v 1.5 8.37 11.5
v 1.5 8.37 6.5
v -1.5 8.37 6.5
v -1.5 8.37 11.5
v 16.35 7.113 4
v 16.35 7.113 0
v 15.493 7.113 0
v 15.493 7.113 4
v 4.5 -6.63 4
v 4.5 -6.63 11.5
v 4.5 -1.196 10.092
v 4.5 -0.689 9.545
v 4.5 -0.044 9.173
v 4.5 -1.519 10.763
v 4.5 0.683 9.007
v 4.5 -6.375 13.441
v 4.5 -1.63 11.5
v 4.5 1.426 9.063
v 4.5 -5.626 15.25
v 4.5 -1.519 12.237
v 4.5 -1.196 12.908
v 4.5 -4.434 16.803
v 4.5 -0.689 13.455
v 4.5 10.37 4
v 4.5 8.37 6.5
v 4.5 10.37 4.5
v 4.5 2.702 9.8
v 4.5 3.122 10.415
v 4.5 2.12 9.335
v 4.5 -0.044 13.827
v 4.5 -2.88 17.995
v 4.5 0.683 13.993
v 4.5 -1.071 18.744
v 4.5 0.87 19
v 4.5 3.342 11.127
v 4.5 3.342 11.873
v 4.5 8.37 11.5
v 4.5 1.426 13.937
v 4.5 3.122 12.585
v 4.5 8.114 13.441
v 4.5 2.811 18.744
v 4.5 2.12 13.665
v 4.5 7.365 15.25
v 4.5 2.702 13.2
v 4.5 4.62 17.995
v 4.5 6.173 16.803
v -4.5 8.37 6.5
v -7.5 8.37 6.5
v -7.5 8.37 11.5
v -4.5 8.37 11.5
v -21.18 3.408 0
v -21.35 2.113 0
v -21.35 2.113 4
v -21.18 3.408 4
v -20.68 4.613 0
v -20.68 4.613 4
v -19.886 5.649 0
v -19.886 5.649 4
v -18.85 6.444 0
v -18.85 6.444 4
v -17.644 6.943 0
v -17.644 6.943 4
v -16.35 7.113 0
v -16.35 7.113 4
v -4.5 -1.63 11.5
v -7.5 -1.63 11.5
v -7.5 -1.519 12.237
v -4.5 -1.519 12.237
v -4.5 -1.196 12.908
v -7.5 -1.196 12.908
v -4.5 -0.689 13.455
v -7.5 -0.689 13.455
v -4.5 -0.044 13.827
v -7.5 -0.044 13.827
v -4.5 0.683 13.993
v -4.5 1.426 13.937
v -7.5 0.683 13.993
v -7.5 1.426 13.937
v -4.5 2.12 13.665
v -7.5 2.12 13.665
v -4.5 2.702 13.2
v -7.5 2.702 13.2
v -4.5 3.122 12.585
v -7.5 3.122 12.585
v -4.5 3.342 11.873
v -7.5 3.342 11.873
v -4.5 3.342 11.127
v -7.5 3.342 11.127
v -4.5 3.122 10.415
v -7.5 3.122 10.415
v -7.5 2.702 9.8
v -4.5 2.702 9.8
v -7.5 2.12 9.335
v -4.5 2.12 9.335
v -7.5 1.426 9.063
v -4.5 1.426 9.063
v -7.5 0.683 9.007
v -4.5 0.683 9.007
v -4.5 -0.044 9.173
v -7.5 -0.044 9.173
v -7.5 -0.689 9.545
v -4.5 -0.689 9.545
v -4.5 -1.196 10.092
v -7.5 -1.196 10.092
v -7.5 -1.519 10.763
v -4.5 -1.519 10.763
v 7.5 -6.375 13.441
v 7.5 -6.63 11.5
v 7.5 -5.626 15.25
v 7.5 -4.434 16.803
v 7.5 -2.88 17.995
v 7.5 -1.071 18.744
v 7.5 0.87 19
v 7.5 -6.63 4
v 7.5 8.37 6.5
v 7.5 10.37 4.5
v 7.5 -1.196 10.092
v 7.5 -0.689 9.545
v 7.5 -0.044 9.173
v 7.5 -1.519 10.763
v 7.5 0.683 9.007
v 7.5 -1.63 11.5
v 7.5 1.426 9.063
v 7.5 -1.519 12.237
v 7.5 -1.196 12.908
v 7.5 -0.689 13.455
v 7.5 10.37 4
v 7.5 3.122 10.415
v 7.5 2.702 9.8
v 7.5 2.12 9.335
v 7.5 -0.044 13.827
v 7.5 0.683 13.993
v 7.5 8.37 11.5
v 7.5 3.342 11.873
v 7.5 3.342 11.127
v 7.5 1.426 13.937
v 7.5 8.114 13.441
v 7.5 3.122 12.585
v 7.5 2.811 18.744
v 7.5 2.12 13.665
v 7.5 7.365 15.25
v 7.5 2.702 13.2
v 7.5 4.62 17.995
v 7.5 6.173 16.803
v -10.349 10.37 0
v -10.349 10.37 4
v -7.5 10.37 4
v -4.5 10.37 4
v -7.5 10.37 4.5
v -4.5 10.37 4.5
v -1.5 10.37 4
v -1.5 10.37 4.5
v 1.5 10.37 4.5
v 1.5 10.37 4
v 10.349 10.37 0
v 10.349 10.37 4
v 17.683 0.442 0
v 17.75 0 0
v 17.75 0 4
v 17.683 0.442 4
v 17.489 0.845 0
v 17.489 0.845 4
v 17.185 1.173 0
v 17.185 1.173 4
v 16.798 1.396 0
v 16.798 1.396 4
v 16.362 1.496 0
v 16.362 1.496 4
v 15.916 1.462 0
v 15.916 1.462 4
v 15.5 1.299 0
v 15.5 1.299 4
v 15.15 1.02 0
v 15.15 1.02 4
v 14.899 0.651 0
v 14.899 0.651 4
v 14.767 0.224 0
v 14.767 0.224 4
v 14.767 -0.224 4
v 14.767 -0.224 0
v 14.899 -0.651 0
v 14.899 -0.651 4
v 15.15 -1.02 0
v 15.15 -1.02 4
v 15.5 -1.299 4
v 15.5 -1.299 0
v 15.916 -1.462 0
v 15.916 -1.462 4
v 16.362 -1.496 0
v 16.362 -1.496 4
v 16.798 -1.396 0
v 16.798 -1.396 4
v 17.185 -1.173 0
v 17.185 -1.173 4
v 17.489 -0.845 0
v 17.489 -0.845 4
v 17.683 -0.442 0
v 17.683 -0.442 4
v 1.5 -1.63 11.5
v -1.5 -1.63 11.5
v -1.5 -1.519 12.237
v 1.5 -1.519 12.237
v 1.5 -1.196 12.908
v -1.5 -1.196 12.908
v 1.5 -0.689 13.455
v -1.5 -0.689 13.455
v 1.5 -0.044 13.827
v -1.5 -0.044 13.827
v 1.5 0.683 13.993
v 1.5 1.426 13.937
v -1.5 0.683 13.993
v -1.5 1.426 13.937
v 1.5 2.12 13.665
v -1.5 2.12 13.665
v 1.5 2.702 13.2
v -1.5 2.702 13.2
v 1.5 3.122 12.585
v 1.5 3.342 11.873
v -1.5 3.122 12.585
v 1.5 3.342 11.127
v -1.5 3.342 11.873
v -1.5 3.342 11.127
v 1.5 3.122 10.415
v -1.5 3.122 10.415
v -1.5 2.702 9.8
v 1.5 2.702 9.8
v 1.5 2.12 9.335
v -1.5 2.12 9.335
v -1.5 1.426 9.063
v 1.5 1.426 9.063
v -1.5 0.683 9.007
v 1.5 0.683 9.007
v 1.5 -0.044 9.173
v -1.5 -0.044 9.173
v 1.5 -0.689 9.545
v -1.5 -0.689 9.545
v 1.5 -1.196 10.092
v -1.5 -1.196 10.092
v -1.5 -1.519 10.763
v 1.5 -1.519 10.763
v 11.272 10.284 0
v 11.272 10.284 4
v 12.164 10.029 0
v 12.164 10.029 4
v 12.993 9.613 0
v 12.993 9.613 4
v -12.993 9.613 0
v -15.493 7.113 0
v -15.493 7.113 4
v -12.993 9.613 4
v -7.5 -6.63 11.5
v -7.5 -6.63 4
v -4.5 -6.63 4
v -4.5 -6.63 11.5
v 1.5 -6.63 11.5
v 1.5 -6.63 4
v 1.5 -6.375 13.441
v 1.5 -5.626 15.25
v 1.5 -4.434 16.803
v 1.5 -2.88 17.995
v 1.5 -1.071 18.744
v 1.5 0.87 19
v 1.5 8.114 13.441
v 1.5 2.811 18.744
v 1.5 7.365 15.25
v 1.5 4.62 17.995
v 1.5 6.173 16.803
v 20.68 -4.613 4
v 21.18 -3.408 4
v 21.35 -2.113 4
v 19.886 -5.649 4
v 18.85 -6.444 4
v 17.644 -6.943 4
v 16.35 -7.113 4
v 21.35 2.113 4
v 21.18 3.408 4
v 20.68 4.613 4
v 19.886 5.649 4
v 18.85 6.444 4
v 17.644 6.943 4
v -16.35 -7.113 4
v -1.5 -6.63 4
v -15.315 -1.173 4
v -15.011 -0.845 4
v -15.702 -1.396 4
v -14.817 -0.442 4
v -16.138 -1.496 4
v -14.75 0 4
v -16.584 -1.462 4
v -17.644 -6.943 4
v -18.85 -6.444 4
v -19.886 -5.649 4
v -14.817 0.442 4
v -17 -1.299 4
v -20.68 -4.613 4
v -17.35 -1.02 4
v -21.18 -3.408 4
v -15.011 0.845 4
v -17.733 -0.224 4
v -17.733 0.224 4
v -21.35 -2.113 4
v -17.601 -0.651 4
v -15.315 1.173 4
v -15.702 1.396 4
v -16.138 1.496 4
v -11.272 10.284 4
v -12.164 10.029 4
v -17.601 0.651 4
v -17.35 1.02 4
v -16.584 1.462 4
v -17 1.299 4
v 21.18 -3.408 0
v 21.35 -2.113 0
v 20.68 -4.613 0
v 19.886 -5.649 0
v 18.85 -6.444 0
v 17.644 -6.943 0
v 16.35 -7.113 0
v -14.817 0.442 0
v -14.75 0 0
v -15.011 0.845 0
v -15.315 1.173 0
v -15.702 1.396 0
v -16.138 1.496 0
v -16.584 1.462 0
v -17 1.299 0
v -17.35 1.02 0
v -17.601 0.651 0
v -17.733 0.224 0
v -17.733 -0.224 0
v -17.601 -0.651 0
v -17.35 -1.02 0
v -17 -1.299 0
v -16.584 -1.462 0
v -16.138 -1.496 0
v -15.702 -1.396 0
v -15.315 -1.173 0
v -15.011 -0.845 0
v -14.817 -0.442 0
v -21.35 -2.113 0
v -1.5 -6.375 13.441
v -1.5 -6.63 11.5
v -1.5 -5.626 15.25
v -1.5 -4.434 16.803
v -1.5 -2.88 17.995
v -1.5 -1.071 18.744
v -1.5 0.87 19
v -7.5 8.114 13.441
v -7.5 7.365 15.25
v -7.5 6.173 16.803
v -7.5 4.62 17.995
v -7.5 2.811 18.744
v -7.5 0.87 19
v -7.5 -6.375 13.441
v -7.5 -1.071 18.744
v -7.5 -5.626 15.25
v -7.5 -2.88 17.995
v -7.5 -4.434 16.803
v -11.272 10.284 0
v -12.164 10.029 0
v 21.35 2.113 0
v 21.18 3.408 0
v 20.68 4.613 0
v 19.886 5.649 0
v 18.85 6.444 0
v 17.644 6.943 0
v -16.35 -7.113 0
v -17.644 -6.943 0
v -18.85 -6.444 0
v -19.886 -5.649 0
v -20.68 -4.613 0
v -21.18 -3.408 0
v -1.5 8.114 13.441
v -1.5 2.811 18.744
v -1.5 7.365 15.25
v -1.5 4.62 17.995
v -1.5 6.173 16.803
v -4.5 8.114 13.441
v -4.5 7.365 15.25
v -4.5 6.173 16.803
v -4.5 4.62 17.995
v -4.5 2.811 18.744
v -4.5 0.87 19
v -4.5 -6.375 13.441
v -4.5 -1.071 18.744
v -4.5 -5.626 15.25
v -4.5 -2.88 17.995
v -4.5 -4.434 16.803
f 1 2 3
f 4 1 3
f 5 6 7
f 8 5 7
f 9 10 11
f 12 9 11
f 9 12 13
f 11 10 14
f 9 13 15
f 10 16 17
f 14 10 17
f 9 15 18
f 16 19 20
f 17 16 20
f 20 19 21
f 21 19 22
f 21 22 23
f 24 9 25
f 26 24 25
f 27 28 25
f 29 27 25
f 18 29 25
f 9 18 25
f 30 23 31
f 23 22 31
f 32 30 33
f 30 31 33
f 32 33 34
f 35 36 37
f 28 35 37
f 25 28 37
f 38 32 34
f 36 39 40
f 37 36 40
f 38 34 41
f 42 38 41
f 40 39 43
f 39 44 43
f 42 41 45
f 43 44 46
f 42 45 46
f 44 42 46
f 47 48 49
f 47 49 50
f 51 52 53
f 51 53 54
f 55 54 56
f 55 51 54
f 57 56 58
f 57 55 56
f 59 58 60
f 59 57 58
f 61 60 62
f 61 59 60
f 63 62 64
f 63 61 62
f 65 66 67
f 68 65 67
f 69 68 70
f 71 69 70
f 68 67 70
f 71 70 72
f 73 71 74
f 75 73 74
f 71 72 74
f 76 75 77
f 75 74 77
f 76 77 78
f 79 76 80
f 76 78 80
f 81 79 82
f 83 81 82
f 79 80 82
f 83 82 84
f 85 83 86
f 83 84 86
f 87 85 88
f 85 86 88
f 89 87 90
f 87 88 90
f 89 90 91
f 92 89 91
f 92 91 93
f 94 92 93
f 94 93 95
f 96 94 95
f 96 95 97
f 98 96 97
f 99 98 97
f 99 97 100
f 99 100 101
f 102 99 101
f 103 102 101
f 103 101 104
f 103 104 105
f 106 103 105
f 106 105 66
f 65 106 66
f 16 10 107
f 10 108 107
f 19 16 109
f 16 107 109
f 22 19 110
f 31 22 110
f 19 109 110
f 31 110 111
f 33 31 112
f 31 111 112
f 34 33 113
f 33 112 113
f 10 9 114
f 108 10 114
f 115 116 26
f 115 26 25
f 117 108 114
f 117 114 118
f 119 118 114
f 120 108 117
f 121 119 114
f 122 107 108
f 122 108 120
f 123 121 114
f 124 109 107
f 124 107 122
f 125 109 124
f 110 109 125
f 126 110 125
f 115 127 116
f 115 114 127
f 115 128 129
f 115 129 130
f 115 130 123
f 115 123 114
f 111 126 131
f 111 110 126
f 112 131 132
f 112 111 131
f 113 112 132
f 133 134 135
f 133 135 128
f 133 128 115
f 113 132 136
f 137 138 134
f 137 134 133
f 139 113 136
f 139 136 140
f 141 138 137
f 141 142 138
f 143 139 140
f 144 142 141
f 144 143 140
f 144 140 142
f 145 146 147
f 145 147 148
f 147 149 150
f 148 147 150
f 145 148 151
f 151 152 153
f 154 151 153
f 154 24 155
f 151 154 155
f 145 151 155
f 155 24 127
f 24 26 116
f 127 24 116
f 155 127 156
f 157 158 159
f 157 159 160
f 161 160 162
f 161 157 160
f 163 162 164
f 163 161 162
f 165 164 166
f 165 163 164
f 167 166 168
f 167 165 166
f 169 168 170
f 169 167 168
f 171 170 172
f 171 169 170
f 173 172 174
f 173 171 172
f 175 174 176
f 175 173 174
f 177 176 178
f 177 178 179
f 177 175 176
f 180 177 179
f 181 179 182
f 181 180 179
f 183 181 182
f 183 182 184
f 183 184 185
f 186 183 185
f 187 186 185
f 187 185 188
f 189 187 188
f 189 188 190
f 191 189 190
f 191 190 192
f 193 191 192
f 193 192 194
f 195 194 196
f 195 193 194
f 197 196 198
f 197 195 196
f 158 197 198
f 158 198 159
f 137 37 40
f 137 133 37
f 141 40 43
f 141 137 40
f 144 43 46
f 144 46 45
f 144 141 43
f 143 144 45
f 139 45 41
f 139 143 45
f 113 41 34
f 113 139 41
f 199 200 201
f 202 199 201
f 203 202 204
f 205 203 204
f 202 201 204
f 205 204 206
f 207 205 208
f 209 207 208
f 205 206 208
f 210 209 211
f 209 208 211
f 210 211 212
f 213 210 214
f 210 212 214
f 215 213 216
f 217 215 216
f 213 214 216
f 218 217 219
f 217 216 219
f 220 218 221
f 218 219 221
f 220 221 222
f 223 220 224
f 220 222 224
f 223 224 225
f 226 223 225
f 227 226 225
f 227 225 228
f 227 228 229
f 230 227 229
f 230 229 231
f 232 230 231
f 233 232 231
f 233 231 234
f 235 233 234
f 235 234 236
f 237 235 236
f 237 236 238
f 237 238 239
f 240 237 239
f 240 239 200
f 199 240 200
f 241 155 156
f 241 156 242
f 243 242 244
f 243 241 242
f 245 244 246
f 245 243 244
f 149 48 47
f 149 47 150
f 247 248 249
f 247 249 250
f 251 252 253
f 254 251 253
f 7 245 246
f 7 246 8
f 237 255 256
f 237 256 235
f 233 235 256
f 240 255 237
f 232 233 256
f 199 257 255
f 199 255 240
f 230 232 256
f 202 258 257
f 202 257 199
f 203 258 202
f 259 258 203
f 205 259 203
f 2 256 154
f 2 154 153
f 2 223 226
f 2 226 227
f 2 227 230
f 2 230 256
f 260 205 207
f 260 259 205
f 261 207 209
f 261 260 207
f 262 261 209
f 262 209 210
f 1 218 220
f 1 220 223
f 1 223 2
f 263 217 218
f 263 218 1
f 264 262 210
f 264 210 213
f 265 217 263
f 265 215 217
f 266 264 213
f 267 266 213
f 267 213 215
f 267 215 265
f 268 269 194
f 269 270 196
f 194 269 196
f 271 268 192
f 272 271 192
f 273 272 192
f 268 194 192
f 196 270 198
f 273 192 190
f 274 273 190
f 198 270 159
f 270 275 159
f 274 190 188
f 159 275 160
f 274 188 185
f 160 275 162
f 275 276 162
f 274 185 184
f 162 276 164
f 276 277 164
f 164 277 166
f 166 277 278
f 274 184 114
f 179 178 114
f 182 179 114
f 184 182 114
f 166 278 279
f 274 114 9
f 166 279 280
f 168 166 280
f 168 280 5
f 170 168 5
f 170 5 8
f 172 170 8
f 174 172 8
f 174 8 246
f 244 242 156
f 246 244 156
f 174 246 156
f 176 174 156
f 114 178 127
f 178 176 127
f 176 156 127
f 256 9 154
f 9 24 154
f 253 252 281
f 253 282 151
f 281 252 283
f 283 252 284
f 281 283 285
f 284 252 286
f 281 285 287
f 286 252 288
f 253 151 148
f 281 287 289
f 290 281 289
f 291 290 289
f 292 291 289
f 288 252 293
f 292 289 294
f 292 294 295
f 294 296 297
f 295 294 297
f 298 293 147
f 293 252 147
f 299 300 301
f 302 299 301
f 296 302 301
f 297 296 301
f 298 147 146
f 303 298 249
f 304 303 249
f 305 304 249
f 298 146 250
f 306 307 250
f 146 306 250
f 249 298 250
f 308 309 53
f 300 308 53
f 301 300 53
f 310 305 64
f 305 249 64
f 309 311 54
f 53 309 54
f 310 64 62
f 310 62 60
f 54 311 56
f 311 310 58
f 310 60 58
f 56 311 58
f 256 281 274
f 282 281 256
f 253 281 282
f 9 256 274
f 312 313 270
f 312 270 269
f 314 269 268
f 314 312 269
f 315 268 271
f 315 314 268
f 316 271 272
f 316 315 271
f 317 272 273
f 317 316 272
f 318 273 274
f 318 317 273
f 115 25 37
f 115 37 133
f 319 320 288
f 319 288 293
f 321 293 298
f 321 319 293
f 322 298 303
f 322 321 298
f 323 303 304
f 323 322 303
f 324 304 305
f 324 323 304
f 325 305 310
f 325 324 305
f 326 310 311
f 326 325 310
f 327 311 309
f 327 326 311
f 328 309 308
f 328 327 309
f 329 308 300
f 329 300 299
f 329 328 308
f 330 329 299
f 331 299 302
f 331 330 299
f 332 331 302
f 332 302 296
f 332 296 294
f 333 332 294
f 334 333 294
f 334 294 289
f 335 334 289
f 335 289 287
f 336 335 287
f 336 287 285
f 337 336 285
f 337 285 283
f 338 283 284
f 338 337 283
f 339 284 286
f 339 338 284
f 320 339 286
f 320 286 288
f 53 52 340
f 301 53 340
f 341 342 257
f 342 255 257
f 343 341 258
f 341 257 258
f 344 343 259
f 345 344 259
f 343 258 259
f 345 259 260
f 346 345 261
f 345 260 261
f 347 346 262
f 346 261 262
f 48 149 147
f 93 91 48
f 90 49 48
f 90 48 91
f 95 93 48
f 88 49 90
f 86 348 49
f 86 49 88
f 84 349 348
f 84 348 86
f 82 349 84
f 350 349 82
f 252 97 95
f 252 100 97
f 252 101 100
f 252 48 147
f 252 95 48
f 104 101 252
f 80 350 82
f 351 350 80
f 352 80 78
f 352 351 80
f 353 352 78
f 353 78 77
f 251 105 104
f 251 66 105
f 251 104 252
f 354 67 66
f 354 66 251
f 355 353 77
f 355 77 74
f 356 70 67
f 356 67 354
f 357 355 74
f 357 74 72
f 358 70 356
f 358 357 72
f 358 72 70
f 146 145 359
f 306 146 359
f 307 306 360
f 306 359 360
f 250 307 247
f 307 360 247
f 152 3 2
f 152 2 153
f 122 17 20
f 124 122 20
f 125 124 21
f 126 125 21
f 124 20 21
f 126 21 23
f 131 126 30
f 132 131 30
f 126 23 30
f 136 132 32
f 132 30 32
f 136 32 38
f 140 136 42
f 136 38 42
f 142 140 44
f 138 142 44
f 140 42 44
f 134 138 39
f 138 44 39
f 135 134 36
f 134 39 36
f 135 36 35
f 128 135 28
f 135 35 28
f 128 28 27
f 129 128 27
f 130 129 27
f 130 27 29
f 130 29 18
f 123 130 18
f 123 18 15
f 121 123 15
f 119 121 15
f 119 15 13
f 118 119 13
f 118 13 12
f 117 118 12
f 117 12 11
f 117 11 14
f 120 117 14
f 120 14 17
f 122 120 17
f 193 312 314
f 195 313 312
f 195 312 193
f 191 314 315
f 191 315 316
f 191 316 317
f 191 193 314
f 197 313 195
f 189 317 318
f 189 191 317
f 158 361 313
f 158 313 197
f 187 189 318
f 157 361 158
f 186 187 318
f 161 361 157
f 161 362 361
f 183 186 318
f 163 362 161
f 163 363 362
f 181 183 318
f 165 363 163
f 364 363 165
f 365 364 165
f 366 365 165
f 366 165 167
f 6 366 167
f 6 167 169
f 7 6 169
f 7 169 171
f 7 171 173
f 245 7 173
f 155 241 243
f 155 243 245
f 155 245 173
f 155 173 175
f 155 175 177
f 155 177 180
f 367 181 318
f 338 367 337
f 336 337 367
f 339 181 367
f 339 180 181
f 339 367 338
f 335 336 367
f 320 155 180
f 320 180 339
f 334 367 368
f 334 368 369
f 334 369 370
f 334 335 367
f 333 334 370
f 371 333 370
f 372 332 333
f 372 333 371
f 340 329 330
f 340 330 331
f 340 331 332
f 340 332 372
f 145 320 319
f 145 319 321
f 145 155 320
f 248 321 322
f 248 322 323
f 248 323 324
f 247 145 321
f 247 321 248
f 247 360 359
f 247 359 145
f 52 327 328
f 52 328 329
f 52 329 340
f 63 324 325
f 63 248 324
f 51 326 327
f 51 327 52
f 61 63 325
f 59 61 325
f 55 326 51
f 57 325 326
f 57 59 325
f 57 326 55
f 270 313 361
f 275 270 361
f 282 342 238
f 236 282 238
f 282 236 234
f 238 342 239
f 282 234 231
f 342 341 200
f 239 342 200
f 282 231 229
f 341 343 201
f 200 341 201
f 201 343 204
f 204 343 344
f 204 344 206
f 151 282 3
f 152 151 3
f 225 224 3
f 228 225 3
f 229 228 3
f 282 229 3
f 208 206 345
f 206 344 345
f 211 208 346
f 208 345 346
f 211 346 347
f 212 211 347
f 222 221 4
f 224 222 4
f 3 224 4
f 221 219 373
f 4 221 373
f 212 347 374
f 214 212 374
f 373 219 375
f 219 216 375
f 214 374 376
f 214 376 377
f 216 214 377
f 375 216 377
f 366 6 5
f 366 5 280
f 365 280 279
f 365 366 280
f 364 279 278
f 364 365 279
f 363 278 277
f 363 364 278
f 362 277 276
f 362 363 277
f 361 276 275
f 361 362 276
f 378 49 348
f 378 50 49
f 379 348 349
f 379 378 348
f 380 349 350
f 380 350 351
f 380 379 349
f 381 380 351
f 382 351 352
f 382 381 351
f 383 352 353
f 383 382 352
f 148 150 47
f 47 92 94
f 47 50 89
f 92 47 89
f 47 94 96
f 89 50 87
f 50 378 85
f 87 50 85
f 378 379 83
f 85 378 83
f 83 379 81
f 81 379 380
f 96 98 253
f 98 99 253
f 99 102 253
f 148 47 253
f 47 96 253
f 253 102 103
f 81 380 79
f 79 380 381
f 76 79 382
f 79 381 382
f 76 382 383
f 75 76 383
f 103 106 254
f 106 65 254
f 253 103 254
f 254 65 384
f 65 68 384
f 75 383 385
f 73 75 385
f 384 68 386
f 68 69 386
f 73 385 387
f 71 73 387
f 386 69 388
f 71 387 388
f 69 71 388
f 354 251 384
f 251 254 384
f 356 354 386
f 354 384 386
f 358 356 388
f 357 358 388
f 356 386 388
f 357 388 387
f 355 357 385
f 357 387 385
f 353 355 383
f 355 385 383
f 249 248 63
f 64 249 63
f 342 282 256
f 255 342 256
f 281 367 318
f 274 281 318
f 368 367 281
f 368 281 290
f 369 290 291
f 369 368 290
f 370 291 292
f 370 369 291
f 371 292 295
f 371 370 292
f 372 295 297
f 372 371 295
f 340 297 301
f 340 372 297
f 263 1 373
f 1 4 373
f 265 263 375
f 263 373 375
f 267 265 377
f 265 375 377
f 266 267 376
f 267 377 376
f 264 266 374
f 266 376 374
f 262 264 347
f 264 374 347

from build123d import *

# Parameters (mm, degrees)
F0_R         = 1.5
F0_W         = 3
F0_H         = 13.7437733207
F0_H_2       = 1.2562266793
F1_DEPTH     = 4
F2_DEPTH     = 19
F3_R         = 7.49999
F4_R         = 2.5
F5_DEPTH     = 28.851
F6_T1_DEPTH  = 4
F6_T6_DEPTH  = 3
F6_T11_DEPTH = 9.4292074699
F6_T18_DEPTH = 9.4292074699
F6_T25_DEPTH = 3
F6_T30_DEPTH = 9.4292074699
F6_T37_DEPTH = 9.4292074699
F6_T44_DEPTH = 3
F7_T1_DEPTH  = 17.2196709514
F7_T3_DEPTH  = 29


# Not quite as in the source:
# - a fillet or chamfer that OpenCascade refuses, or shapes differently, is made with other operations: its cross-section is extruded or revolved along the edge and cut away or added
# - a fillet or chamfer is up to 0.001 mm smaller than in the source, because OpenCascade refuses the exact size


with BuildPart() as f1:
    # F0 (on Top) → F1 (new body)
    with BuildSketch(Plane.XY):
        Polygon((-12.9930239742, 7.1134486855), (-21.35, 7.1134486855), (-21.35, -7.1134486855), (21.35, -7.1134486855), (21.35, 7.1134486855), (12.9930239742, 7.1134486855), (7.5, 7.1134486855), (7.5, -6.6303246352), (4.5, -6.6303246352), (4.5, 7.1134486855), (1.5, 7.1134486855), (1.5, -6.6303246352), (-1.5, -6.6303246352), (-1.5, 7.1134486855), (-4.5, 7.1134486855), (-4.5, -6.6303246352), (-7.5, -6.6303246352), (-7.5, 7.1134486855), align=None)
        with Locations((-16.25, 0)):
            Circle(F0_R, mode=Mode.SUBTRACT)
        with Locations((16.25, 0)):
            Circle(F0_R, mode=Mode.SUBTRACT)
        Polygon((-12.9930239742, 10.3696753648), (-12.9930239742, 7.1134486855), (-7.5, 7.1134486855), (-7.5, 8.3696753648), (-4.5, 8.3696753648), (-1.5, 8.3696753648), (1.5, 8.3696753648), (4.5, 8.3696753648), (7.5, 8.3696753648), (7.5, 7.1134486855), (12.9930239742, 7.1134486855), (12.9930239742, 10.3696753648), align=None)
        with Locations((-6, 0.2415620252)):
            Rectangle(F0_W, F0_H)
        with Locations((-6, 7.7415620252)):
            Rectangle(F0_W, F0_H_2)
        with Locations((-3, 7.7415620252)):
            Rectangle(F0_W, F0_H_2)
        Polygon((-1.5, 8.3696753648), (-1.5, 7.1134486855), (0, 7.1134486855), (1.5, 7.1134486855), (1.5, 8.3696753648), align=None)
        Polygon((0, 7.1134486855), (-1.5, 7.1134486855), (-1.5, -6.6303246352), (1.5, -6.6303246352), (1.5, 7.1134486855), align=None)
        with Locations((3, 7.7415620252)):
            Rectangle(F0_W, F0_H_2)
        with Locations((6, 0.2415620252)):
            Rectangle(F0_W, F0_H)
        with Locations((6, 7.7415620252)):
            Rectangle(F0_W, F0_H_2)
    extrude(amount=F1_DEPTH)

    # F0 (on Top) → F2 (join)
    with BuildSketch(Plane.XY):
        with Locations((-6, 0.2415620252)):
            Rectangle(F0_W, F0_H)
        with Locations((-6, 7.7415620252)):
            Rectangle(F0_W, F0_H_2)
        Polygon((-1.5, 8.3696753648), (-1.5, 7.1134486855), (0, 7.1134486855), (1.5, 7.1134486855), (1.5, 8.3696753648), align=None)
        Polygon((0, 7.1134486855), (-1.5, 7.1134486855), (-1.5, -6.6303246352), (1.5, -6.6303246352), (1.5, 7.1134486855), align=None)
        with Locations((6, 0.2415620252)):
            Rectangle(F0_W, F0_H)
        with Locations((6, 7.7415620252)):
            Rectangle(F0_W, F0_H_2)
    extrude(amount=F2_DEPTH)

    # F3 (radius 7.5 in the source; OpenCascade refuses exactly that, so slightly less here)
    f3_edges = [f1.edges().sort_by_distance(p)[0] for p in [
        (-6, -6.630325, 19),
        (0, -6.630325, 19),
        (6, -6.630325, 19),
        (6, 8.369675, 19),
        (0, 8.369675, 19),
        (-6, 8.369675, 19),
    ]]
    fillet(f3_edges, radius=F3_R)

    # F4 (on face) → F5 (cut, through all)
    with BuildSketch(Plane(origin=(-7.5, 0, 0), x_dir=(0, -1, 0), z_dir=(-1, 0, 0))):
        with Locations((-0.8696753648, 11.5)):
            Circle(F4_R)
    extrude(amount=-F5_DEPTH, mode=Mode.SUBTRACT)

    # F6: chamfer of 2.5 on 5 edges, made by hand

    # F6_s2 → F6_t1 (join)
    with BuildSketch(Plane.XY):
        Polygon((12.9930239742, 9.6134486855), (15.4930239742, 7.1134486855), (12.9930239742, 7.1134486855), align=None)
        Polygon((-15.4930239742, 7.1134486855), (-12.9930239742, 9.6134486855), (-12.9930239742, 7.1134486855), align=None)
    extrude(amount=F6_T1_DEPTH)


with BuildPart() as f6_tool4:
    # F6_s5 → F6_t6 (new body)
    with BuildSketch(Plane.YZ.offset(-7.5)):
        Polygon((8.3696753648, 6.5), (10.8696753648, 4), (8.3696753648, 4), align=None)
    extrude(amount=F6_T6_DEPTH)

    split(bisect_by=Plane.XZ.offset(-10.3696753648), keep=Keep.TOP)


with BuildPart() as f1_1:
    add(f1.part)

    # F6_t3: union F6_tool4
    add(f6_tool4.part)


with BuildPart() as f6_tool9:
    # F6_s10 → F6_t11 (new body)
    with BuildSketch(Plane.YZ.offset(-7.5)):
        Polygon((8.3696753648, 6.5), (10.8696753648, 4), (8.3696753648, 4), align=None)
    extrude(amount=F6_T11_DEPTH)

    split(bisect_by=Plane.XZ.offset(-10.3696753648), keep=Keep.TOP)

    split(bisect_by=Plane.YZ.offset(-1.5), keep=Keep.TOP)

    split(bisect_by=Plane.YZ.offset(1.5), keep=Keep.BOTTOM)


with BuildPart() as f1_2:
    add(f1_1.part)

    # F6_t8: union F6_tool9
    add(f6_tool9.part)


with BuildPart() as f6_tool16:
    # F6_s17 → F6_t18 (new body)
    with BuildSketch(Plane.YZ.offset(-7.9292074699)):
        Polygon((10.8696753648, 4), (8.3696753648, 6.5), (8.3696753648, 4), align=None)
    extrude(amount=F6_T18_DEPTH)

    split(bisect_by=Plane.YZ.offset(-7.5), keep=Keep.TOP)

    split(bisect_by=Plane.YZ.offset(-4.5), keep=Keep.BOTTOM)

    split(bisect_by=Plane.XZ.offset(-10.3696753648), keep=Keep.TOP)


with BuildPart() as f1_3:
    add(f1_2.part)

    # F6_t15: union F6_tool16
    add(f6_tool16.part)


with BuildPart() as f6_tool23:
    # F6_s24 → F6_t25 (new body)
    with BuildSketch(Plane.YZ.offset(-1.5)):
        Polygon((10.8696753648, 4), (8.3696753648, 6.5), (8.3696753648, 4), align=None)
    extrude(amount=F6_T25_DEPTH)

    split(bisect_by=Plane.XZ.offset(-10.3696753648), keep=Keep.TOP)


with BuildPart() as f1_4:
    add(f1_3.part)

    # F6_t22: union F6_tool23
    add(f6_tool23.part)


with BuildPart() as f6_tool28:
    # F6_s29 → F6_t30 (new body)
    with BuildSketch(Plane.YZ.offset(-1.5)):
        Polygon((10.8696753648, 4), (8.3696753648, 6.5), (8.3696753648, 4), align=None)
    extrude(amount=F6_T30_DEPTH)

    split(bisect_by=Plane.XZ.offset(-10.3696753648), keep=Keep.TOP)

    split(bisect_by=Plane.YZ.offset(4.5), keep=Keep.TOP)

    split(bisect_by=Plane.YZ.offset(7.5), keep=Keep.BOTTOM)


with BuildPart() as f1_5:
    add(f1_4.part)

    # F6_t27: union F6_tool28
    add(f6_tool28.part)


with BuildPart() as f6_tool35:
    # F6_s36 → F6_t37 (new body)
    with BuildSketch(Plane.YZ.offset(-1.9292074699)):
        Polygon((10.8696753648, 4), (8.3696753648, 6.5), (8.3696753648, 4), align=None)
    extrude(amount=F6_T37_DEPTH)

    split(bisect_by=Plane.XZ.offset(-10.3696753648), keep=Keep.TOP)

    split(bisect_by=Plane.YZ.offset(-1.5), keep=Keep.TOP)

    split(bisect_by=Plane.YZ.offset(1.5), keep=Keep.BOTTOM)


with BuildPart() as f1_6:
    add(f1_5.part)

    # F6_t34: union F6_tool35
    add(f6_tool35.part)


with BuildPart() as f6_tool42:
    # F6_s43 → F6_t44 (new body)
    with BuildSketch(Plane.YZ.offset(4.5)):
        Polygon((10.8696753648, 4), (8.3696753648, 6.5), (8.3696753648, 4), align=None)
    extrude(amount=F6_T44_DEPTH)

    split(bisect_by=Plane.XZ.offset(-10.3696753648), keep=Keep.TOP)


with BuildPart() as f1_7:
    add(f1_6.part)

    # F6_t41: union F6_tool42
    add(f6_tool42.part)

    # F7: fillet of radius 5 on 6 edges, made by hand

    # F7_s2 → F7_t1 (cut)
    with BuildSketch(Plane.XY.offset(-6.6098354757)):
        with BuildLine():
            ThreePointArc((10.3490897839, 10.3696753648), (11.7240685831, 10.1769025595), (12.9930239742, 9.6134486855))
            Line((12.9930239742, 9.6134486855), (12.9930239742, 10.3696753648))
            Line((12.9930239742, 10.3696753648), (10.3490897839, 10.3696753648))
        make_face()
        with BuildLine():
            ThreePointArc((-10.3490897839, 10.3696753648), (-11.7240685831, 10.1769025595), (-12.9930239742, 9.6134486855))
            Line((-12.9930239742, 9.6134486855), (-12.9930239742, 10.3696753648))
            Line((-12.9930239742, 10.3696753648), (-10.3490897839, 10.3696753648))
        make_face()
    extrude(amount=F7_T1_DEPTH, mode=Mode.SUBTRACT)

    # F7_s4 → F7_t3 (cut)
    with BuildSketch(Plane.XY.offset(-12.5)):
        with BuildLine():
            ThreePointArc((-21.35, 2.1134486855), (-19.8855339059, 5.6489825915), (-16.35, 7.1134486855))
            Line((-16.35, 7.1134486855), (-21.35, 7.1134486855))
            Line((-21.35, 7.1134486855), (-21.35, 2.1134486855))
        make_face()
        with BuildLine():
            ThreePointArc((-16.35, -7.1134486855), (-19.8855339059, -5.6489825915), (-21.35, -2.1134486855))
            Line((-21.35, -2.1134486855), (-21.35, -7.1134486855))
            Line((-21.35, -7.1134486855), (-16.35, -7.1134486855))
        make_face()
        with BuildLine():
            ThreePointArc((21.35, -2.1134486855), (19.8855339059, -5.6489825915), (16.35, -7.1134486855))
            Line((16.35, -7.1134486855), (21.35, -7.1134486855))
            Line((21.35, -7.1134486855), (21.35, -2.1134486855))
        make_face()
        with BuildLine():
            ThreePointArc((16.35, 7.1134486855), (19.8855339059, 5.6489825915), (21.35, 2.1134486855))
            Line((21.35, 2.1134486855), (21.35, 7.1134486855))
            Line((21.35, 7.1134486855), (16.35, 7.1134486855))
        make_face()
    extrude(amount=F7_T3_DEPTH, mode=Mode.SUBTRACT)


solid = f1_7.part
